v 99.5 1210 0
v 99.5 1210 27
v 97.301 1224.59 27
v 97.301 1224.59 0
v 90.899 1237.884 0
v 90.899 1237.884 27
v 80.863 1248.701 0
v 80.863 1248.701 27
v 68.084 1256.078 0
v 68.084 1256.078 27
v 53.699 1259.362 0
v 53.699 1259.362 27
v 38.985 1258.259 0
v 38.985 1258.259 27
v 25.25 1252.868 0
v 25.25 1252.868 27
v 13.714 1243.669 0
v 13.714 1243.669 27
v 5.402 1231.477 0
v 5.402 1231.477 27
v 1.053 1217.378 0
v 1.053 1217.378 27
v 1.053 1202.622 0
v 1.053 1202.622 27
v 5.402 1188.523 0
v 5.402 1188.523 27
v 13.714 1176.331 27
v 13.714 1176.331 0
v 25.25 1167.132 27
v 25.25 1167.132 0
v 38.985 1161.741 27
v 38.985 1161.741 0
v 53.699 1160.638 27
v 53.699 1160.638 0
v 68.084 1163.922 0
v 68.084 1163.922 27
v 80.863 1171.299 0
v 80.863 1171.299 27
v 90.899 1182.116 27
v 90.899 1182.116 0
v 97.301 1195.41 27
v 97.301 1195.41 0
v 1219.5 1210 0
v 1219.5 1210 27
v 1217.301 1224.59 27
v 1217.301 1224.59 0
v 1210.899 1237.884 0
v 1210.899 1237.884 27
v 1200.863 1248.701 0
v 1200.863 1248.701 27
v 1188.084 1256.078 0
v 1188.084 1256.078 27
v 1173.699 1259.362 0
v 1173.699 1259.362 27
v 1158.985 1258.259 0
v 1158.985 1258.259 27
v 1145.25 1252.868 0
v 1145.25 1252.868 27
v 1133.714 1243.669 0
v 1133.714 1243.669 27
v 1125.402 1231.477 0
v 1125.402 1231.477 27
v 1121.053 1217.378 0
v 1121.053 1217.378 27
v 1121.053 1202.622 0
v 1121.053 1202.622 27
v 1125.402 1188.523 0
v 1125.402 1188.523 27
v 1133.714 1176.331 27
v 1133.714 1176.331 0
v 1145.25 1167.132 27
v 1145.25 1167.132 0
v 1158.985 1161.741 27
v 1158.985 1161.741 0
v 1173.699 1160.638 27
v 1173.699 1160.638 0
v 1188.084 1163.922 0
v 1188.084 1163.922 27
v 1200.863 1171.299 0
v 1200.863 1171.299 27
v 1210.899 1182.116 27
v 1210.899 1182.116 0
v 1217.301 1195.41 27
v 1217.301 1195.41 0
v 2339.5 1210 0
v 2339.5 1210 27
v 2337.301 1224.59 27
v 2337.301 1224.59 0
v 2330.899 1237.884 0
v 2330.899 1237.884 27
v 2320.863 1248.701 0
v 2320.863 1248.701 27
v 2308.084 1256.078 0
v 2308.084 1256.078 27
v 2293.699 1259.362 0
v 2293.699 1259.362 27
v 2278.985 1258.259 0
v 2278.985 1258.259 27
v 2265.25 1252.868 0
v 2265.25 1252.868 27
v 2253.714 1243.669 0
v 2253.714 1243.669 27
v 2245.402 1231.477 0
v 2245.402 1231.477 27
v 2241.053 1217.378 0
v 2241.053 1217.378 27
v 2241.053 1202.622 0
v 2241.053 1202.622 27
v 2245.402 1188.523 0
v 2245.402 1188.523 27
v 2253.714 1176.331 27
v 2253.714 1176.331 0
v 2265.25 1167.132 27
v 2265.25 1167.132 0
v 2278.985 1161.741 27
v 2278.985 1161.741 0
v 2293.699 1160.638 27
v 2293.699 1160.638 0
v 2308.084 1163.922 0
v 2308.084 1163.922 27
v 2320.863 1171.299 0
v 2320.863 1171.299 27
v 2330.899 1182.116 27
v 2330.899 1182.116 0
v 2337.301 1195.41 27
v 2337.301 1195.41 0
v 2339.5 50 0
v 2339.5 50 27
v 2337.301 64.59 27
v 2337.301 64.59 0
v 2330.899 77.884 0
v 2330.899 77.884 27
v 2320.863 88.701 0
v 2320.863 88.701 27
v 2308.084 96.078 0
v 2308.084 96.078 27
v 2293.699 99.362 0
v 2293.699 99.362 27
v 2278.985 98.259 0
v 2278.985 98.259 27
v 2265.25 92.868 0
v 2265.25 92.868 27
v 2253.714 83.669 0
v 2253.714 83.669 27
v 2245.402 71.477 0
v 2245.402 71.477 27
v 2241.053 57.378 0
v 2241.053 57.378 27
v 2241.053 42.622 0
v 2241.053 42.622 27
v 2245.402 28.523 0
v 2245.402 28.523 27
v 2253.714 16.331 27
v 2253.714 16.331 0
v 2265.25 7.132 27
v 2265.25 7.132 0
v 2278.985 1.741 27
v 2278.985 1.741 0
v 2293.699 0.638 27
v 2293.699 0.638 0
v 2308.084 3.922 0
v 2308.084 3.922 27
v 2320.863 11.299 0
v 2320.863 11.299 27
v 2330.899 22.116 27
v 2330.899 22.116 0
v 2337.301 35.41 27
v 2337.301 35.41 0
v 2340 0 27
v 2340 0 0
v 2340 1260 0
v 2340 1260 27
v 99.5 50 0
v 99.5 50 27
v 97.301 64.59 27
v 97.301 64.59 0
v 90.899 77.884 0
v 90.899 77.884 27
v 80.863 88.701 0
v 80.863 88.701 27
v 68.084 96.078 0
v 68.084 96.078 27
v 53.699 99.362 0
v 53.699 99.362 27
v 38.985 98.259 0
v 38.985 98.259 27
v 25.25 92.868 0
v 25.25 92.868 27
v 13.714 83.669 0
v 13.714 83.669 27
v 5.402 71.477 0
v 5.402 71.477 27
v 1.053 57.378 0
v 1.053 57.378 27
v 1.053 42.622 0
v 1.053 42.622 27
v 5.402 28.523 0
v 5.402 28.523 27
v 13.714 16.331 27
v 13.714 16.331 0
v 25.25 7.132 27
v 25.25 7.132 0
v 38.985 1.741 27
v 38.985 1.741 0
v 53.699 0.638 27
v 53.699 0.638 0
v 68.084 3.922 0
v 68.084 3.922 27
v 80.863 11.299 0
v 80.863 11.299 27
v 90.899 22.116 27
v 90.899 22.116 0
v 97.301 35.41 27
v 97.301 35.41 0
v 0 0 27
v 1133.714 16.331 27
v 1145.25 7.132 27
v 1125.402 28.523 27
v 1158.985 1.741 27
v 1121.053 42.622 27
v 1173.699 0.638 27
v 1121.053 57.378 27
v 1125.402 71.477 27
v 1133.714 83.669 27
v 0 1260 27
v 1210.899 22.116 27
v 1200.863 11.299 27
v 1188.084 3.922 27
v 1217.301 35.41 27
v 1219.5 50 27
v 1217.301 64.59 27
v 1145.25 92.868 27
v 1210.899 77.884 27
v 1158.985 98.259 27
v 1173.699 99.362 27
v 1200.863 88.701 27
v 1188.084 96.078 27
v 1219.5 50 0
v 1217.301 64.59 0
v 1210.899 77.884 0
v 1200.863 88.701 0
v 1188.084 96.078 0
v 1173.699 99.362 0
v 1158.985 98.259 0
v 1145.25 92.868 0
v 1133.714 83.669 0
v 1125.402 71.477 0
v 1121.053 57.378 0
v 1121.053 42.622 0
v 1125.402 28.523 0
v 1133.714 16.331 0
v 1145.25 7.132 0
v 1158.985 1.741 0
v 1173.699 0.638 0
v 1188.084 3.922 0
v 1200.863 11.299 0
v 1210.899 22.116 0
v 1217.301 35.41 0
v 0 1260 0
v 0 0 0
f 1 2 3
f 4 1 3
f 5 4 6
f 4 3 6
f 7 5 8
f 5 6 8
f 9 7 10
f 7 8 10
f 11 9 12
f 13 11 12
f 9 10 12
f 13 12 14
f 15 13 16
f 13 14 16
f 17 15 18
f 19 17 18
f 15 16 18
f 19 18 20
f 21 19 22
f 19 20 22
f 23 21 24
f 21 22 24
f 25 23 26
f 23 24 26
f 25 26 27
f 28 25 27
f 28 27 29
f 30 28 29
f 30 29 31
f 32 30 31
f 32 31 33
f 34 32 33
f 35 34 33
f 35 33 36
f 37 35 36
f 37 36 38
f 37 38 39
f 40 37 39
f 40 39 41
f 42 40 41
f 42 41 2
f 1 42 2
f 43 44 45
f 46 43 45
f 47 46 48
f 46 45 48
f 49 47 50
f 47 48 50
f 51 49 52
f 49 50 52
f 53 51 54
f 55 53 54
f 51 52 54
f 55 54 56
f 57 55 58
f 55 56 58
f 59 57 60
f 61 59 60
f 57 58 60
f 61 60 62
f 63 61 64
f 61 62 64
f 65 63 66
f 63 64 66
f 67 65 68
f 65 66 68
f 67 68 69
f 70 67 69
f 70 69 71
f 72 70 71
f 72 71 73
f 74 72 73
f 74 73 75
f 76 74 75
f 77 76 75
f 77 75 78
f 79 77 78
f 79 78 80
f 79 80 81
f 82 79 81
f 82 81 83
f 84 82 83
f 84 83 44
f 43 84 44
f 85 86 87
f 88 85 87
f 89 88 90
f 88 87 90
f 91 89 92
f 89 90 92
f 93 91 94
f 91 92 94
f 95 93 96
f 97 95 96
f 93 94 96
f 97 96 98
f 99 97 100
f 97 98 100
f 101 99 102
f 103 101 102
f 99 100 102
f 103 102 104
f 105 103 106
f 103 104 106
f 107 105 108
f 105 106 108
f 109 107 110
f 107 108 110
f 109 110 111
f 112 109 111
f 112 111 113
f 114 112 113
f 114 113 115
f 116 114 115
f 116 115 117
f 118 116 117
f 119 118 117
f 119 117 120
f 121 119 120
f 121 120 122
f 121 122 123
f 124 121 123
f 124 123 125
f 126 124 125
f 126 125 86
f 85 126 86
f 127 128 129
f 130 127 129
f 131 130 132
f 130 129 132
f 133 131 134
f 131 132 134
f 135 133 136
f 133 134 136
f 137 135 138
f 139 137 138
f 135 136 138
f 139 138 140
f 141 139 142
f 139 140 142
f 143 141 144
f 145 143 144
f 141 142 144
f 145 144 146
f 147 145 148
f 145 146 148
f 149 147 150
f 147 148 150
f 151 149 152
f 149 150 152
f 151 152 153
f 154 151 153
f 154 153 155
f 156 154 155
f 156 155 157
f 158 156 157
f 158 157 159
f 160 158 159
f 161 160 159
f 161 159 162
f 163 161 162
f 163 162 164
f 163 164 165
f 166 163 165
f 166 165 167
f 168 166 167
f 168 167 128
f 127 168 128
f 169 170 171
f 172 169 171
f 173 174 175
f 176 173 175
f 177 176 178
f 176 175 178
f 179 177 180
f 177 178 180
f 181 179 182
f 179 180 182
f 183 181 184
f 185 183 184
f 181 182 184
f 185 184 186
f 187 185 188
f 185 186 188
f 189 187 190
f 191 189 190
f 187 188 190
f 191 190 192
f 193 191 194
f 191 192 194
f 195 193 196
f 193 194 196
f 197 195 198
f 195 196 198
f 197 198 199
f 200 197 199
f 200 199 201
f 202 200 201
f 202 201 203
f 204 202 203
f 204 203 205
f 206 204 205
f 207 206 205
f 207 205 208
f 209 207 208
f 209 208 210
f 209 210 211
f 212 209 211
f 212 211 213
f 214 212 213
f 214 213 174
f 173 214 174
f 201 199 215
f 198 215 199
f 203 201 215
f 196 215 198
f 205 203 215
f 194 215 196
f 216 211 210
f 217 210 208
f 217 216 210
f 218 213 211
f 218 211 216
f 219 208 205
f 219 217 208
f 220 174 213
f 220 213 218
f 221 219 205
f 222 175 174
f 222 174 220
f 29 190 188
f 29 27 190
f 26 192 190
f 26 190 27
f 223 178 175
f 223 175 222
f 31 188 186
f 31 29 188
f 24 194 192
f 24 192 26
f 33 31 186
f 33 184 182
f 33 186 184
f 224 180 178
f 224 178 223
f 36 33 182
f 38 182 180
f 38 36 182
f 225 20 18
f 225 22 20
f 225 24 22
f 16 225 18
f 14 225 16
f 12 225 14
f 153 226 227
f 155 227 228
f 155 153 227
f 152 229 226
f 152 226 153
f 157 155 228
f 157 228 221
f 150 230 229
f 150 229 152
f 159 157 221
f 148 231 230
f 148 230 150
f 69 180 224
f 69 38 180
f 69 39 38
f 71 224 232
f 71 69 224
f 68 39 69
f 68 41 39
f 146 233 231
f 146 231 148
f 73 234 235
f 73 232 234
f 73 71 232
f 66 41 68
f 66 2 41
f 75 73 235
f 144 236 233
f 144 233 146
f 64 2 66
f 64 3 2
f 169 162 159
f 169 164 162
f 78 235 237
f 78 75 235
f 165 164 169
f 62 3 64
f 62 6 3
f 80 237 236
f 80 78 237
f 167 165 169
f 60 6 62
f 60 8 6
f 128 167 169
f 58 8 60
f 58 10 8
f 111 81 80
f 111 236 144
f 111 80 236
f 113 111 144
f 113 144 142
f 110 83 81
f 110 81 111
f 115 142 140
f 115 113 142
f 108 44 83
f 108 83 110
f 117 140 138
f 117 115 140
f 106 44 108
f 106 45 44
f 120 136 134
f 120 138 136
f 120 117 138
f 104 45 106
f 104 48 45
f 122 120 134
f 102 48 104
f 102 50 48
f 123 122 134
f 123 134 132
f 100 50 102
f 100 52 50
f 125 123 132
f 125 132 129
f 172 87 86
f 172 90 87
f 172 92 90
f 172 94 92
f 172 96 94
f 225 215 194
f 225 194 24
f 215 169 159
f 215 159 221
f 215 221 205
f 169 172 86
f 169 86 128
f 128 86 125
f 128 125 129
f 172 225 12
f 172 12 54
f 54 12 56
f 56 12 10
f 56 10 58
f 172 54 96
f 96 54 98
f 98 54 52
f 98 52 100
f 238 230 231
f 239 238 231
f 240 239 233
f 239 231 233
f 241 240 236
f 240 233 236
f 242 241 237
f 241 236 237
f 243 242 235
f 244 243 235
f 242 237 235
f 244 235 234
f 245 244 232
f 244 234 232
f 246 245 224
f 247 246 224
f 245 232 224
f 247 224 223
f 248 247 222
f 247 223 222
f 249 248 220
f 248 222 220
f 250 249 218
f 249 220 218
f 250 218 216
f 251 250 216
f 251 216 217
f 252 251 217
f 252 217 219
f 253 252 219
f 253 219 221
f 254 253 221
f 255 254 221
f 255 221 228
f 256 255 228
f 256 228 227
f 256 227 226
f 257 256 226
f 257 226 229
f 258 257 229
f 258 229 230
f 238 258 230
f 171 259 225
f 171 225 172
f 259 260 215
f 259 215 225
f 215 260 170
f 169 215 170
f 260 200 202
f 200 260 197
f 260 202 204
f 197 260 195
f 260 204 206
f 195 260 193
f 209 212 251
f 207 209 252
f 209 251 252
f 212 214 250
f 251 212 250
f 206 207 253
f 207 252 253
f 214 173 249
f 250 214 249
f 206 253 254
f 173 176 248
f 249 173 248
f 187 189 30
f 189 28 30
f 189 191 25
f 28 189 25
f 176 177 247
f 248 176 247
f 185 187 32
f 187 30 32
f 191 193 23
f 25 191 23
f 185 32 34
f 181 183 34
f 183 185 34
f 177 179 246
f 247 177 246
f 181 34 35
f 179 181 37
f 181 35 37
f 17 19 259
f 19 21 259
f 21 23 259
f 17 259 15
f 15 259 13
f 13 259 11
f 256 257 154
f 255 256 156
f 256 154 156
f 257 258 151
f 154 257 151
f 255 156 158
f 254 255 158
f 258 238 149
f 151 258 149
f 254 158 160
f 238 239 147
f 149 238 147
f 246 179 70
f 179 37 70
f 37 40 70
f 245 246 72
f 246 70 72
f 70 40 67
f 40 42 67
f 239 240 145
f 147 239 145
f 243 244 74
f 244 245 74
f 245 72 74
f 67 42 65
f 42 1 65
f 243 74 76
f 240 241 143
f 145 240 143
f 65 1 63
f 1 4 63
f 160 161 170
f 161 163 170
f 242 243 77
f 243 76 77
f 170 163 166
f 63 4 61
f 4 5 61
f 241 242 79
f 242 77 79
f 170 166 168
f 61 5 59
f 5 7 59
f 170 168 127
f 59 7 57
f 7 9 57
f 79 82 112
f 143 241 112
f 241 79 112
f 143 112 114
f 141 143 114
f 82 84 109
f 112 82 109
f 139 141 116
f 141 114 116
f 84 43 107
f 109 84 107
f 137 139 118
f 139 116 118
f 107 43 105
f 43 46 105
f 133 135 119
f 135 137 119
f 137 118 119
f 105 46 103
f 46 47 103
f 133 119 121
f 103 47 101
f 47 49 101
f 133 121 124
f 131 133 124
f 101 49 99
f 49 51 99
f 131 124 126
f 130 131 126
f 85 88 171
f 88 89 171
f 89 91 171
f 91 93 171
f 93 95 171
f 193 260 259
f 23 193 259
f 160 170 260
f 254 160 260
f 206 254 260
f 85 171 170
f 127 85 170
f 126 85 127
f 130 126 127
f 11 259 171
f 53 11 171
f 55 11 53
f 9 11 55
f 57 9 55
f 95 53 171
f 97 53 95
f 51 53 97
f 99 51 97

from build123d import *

# Parameters (mm, degrees)
F0_W     = 2340
F0_H     = 1260
F1_DEPTH = 27
F2_R     = 49.5
F3_DEPTH = 27.001


with BuildPart() as f1:
    # F0 (on Top) → F1 (new body)
    with BuildSketch(Plane.XY):
        with Locations((1170, 630)):
            Rectangle(F0_W, F0_H)
    extrude(amount=F1_DEPTH)

    # F2 (on face) → F3 (cut, through all)
    with BuildSketch(Plane.XY.offset(27)):
        with Locations((50, 1210)):
            Circle(F2_R)
        with Locations((1170, 1210)):
            Circle(F2_R)
        with Locations((2290, 1210)):
            Circle(F2_R)
        with Locations((2290, 50)):
            Circle(F2_R)
        with Locations((1170, 50)):
            Circle(F2_R)
        with Locations((50, 50)):
            Circle(F2_R)
    extrude(amount=-F3_DEPTH, mode=Mode.SUBTRACT)


solid = f1.part
